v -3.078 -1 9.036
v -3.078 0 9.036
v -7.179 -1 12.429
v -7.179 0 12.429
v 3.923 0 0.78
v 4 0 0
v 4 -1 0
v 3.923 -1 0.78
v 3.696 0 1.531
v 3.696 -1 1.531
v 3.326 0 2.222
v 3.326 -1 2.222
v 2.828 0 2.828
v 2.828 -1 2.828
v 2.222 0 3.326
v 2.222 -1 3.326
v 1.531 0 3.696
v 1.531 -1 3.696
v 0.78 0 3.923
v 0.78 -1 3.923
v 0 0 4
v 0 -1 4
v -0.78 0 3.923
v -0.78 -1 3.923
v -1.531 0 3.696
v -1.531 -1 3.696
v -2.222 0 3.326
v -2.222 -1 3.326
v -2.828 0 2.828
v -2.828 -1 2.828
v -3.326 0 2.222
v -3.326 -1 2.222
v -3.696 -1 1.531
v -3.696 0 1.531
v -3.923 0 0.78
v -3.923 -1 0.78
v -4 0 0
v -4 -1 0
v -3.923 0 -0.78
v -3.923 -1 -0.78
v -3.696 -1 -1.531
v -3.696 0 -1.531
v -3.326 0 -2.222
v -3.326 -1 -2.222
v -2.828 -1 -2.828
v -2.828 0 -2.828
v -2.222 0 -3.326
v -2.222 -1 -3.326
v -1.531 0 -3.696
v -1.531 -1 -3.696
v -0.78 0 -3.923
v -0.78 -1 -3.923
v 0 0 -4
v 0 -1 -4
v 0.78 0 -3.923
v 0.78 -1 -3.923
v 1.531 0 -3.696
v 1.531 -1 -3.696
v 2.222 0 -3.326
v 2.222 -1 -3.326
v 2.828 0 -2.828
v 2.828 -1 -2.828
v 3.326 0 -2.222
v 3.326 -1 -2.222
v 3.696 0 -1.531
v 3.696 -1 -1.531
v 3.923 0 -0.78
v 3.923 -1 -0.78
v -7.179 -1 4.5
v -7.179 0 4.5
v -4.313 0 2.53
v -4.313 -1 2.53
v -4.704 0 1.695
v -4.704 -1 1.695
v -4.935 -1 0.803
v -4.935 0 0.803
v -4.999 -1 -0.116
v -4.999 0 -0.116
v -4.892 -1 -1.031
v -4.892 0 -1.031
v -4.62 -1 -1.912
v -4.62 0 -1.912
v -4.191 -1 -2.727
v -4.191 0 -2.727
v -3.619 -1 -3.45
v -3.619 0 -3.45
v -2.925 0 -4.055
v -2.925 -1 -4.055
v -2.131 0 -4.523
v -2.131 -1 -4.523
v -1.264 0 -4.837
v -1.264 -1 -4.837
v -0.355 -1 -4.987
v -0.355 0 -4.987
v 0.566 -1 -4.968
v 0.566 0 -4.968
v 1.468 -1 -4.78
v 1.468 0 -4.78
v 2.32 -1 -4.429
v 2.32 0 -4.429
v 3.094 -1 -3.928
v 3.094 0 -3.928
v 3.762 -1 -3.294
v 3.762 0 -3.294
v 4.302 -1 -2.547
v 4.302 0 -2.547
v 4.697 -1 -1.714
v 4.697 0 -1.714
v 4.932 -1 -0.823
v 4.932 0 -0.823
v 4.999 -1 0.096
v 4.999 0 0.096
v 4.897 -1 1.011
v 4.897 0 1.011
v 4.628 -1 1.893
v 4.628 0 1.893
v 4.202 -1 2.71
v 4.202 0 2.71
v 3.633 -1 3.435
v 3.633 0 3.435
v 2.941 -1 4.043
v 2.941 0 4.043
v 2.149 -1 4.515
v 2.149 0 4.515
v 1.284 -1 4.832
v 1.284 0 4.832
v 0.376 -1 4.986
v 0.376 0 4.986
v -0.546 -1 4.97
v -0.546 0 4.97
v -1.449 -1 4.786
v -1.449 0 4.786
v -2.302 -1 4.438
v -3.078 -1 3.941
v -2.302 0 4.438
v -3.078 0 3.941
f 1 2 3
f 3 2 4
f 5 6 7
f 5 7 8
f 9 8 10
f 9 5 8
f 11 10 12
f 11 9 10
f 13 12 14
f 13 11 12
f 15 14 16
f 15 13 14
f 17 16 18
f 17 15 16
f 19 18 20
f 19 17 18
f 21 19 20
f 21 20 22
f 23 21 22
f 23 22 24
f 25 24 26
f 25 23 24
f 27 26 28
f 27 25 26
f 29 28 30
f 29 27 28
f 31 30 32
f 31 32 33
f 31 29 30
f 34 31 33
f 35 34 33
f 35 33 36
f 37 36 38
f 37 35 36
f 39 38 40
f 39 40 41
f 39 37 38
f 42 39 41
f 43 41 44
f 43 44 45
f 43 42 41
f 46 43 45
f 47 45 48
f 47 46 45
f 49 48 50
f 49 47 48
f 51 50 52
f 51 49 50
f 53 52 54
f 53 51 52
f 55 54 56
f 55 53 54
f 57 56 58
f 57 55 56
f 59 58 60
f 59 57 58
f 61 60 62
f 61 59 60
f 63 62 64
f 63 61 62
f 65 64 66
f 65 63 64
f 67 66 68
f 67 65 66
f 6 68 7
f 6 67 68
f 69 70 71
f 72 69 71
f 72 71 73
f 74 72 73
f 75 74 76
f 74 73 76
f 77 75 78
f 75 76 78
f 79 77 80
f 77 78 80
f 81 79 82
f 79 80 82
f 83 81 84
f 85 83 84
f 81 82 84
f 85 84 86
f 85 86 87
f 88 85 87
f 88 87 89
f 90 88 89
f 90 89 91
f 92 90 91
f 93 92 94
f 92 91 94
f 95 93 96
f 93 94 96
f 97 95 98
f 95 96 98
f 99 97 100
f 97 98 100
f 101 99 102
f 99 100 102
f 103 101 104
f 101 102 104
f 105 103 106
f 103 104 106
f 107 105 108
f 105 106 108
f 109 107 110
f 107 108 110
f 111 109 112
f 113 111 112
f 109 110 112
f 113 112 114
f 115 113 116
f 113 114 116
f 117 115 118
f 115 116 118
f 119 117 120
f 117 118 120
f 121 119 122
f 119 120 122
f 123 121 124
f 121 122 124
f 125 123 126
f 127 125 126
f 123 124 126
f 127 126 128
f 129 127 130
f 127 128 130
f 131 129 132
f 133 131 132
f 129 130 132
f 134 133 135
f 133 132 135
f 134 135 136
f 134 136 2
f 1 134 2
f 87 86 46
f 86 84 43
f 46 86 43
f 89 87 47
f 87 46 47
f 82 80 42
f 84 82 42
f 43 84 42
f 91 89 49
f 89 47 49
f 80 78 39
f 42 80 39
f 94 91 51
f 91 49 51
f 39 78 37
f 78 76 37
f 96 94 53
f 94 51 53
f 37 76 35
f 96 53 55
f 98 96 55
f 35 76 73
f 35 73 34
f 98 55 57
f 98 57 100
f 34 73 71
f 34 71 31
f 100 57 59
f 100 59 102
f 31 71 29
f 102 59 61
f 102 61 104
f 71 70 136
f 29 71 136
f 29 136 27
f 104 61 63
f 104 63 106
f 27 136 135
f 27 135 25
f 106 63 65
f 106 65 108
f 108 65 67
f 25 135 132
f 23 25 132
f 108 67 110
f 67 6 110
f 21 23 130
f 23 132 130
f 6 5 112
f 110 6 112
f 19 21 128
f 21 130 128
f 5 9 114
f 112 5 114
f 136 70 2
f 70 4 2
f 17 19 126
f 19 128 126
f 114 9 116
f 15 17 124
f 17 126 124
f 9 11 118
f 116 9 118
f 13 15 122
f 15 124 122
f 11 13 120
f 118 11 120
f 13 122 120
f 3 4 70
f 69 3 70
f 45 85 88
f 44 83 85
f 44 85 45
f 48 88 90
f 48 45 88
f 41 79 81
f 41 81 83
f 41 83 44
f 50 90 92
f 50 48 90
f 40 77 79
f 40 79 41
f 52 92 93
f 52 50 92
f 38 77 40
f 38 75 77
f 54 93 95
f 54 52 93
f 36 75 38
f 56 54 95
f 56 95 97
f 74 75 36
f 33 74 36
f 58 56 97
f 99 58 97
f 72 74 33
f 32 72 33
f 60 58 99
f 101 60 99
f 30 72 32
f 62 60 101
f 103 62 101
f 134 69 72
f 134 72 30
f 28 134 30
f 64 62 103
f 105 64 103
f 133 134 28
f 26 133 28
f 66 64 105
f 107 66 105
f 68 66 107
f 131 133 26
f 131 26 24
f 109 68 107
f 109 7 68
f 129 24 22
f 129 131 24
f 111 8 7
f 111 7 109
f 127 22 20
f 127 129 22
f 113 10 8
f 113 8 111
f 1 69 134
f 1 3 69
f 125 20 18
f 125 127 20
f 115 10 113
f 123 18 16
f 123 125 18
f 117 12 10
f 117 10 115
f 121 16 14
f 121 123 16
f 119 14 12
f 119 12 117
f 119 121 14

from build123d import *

# Parameters (mm, degrees)
F0_R     = 4
F1_DEPTH = 1


with BuildPart() as f1:
    # F0 (on Front) → F1 (new body)
    with BuildSketch(Plane.XZ):
        with BuildLine():
            Line((-7.178572, 4.5), (-4.31285, 2.529689))
            ThreePointArc((-4.31285, 2.529689), (3.761974, -3.293563), (-3.077627, 3.940585))
            Line((-3.077627, 3.940585), (-3.077627, 9.035675))
            Line((-3.077627, 9.035675), (-7.178572, 12.428572))
            Line((-7.178572, 12.428572), (-7.178572, 4.5))
        make_face()
        Circle(F0_R, mode=Mode.SUBTRACT)
    extrude(amount=F1_DEPTH)


solid = f1.part
